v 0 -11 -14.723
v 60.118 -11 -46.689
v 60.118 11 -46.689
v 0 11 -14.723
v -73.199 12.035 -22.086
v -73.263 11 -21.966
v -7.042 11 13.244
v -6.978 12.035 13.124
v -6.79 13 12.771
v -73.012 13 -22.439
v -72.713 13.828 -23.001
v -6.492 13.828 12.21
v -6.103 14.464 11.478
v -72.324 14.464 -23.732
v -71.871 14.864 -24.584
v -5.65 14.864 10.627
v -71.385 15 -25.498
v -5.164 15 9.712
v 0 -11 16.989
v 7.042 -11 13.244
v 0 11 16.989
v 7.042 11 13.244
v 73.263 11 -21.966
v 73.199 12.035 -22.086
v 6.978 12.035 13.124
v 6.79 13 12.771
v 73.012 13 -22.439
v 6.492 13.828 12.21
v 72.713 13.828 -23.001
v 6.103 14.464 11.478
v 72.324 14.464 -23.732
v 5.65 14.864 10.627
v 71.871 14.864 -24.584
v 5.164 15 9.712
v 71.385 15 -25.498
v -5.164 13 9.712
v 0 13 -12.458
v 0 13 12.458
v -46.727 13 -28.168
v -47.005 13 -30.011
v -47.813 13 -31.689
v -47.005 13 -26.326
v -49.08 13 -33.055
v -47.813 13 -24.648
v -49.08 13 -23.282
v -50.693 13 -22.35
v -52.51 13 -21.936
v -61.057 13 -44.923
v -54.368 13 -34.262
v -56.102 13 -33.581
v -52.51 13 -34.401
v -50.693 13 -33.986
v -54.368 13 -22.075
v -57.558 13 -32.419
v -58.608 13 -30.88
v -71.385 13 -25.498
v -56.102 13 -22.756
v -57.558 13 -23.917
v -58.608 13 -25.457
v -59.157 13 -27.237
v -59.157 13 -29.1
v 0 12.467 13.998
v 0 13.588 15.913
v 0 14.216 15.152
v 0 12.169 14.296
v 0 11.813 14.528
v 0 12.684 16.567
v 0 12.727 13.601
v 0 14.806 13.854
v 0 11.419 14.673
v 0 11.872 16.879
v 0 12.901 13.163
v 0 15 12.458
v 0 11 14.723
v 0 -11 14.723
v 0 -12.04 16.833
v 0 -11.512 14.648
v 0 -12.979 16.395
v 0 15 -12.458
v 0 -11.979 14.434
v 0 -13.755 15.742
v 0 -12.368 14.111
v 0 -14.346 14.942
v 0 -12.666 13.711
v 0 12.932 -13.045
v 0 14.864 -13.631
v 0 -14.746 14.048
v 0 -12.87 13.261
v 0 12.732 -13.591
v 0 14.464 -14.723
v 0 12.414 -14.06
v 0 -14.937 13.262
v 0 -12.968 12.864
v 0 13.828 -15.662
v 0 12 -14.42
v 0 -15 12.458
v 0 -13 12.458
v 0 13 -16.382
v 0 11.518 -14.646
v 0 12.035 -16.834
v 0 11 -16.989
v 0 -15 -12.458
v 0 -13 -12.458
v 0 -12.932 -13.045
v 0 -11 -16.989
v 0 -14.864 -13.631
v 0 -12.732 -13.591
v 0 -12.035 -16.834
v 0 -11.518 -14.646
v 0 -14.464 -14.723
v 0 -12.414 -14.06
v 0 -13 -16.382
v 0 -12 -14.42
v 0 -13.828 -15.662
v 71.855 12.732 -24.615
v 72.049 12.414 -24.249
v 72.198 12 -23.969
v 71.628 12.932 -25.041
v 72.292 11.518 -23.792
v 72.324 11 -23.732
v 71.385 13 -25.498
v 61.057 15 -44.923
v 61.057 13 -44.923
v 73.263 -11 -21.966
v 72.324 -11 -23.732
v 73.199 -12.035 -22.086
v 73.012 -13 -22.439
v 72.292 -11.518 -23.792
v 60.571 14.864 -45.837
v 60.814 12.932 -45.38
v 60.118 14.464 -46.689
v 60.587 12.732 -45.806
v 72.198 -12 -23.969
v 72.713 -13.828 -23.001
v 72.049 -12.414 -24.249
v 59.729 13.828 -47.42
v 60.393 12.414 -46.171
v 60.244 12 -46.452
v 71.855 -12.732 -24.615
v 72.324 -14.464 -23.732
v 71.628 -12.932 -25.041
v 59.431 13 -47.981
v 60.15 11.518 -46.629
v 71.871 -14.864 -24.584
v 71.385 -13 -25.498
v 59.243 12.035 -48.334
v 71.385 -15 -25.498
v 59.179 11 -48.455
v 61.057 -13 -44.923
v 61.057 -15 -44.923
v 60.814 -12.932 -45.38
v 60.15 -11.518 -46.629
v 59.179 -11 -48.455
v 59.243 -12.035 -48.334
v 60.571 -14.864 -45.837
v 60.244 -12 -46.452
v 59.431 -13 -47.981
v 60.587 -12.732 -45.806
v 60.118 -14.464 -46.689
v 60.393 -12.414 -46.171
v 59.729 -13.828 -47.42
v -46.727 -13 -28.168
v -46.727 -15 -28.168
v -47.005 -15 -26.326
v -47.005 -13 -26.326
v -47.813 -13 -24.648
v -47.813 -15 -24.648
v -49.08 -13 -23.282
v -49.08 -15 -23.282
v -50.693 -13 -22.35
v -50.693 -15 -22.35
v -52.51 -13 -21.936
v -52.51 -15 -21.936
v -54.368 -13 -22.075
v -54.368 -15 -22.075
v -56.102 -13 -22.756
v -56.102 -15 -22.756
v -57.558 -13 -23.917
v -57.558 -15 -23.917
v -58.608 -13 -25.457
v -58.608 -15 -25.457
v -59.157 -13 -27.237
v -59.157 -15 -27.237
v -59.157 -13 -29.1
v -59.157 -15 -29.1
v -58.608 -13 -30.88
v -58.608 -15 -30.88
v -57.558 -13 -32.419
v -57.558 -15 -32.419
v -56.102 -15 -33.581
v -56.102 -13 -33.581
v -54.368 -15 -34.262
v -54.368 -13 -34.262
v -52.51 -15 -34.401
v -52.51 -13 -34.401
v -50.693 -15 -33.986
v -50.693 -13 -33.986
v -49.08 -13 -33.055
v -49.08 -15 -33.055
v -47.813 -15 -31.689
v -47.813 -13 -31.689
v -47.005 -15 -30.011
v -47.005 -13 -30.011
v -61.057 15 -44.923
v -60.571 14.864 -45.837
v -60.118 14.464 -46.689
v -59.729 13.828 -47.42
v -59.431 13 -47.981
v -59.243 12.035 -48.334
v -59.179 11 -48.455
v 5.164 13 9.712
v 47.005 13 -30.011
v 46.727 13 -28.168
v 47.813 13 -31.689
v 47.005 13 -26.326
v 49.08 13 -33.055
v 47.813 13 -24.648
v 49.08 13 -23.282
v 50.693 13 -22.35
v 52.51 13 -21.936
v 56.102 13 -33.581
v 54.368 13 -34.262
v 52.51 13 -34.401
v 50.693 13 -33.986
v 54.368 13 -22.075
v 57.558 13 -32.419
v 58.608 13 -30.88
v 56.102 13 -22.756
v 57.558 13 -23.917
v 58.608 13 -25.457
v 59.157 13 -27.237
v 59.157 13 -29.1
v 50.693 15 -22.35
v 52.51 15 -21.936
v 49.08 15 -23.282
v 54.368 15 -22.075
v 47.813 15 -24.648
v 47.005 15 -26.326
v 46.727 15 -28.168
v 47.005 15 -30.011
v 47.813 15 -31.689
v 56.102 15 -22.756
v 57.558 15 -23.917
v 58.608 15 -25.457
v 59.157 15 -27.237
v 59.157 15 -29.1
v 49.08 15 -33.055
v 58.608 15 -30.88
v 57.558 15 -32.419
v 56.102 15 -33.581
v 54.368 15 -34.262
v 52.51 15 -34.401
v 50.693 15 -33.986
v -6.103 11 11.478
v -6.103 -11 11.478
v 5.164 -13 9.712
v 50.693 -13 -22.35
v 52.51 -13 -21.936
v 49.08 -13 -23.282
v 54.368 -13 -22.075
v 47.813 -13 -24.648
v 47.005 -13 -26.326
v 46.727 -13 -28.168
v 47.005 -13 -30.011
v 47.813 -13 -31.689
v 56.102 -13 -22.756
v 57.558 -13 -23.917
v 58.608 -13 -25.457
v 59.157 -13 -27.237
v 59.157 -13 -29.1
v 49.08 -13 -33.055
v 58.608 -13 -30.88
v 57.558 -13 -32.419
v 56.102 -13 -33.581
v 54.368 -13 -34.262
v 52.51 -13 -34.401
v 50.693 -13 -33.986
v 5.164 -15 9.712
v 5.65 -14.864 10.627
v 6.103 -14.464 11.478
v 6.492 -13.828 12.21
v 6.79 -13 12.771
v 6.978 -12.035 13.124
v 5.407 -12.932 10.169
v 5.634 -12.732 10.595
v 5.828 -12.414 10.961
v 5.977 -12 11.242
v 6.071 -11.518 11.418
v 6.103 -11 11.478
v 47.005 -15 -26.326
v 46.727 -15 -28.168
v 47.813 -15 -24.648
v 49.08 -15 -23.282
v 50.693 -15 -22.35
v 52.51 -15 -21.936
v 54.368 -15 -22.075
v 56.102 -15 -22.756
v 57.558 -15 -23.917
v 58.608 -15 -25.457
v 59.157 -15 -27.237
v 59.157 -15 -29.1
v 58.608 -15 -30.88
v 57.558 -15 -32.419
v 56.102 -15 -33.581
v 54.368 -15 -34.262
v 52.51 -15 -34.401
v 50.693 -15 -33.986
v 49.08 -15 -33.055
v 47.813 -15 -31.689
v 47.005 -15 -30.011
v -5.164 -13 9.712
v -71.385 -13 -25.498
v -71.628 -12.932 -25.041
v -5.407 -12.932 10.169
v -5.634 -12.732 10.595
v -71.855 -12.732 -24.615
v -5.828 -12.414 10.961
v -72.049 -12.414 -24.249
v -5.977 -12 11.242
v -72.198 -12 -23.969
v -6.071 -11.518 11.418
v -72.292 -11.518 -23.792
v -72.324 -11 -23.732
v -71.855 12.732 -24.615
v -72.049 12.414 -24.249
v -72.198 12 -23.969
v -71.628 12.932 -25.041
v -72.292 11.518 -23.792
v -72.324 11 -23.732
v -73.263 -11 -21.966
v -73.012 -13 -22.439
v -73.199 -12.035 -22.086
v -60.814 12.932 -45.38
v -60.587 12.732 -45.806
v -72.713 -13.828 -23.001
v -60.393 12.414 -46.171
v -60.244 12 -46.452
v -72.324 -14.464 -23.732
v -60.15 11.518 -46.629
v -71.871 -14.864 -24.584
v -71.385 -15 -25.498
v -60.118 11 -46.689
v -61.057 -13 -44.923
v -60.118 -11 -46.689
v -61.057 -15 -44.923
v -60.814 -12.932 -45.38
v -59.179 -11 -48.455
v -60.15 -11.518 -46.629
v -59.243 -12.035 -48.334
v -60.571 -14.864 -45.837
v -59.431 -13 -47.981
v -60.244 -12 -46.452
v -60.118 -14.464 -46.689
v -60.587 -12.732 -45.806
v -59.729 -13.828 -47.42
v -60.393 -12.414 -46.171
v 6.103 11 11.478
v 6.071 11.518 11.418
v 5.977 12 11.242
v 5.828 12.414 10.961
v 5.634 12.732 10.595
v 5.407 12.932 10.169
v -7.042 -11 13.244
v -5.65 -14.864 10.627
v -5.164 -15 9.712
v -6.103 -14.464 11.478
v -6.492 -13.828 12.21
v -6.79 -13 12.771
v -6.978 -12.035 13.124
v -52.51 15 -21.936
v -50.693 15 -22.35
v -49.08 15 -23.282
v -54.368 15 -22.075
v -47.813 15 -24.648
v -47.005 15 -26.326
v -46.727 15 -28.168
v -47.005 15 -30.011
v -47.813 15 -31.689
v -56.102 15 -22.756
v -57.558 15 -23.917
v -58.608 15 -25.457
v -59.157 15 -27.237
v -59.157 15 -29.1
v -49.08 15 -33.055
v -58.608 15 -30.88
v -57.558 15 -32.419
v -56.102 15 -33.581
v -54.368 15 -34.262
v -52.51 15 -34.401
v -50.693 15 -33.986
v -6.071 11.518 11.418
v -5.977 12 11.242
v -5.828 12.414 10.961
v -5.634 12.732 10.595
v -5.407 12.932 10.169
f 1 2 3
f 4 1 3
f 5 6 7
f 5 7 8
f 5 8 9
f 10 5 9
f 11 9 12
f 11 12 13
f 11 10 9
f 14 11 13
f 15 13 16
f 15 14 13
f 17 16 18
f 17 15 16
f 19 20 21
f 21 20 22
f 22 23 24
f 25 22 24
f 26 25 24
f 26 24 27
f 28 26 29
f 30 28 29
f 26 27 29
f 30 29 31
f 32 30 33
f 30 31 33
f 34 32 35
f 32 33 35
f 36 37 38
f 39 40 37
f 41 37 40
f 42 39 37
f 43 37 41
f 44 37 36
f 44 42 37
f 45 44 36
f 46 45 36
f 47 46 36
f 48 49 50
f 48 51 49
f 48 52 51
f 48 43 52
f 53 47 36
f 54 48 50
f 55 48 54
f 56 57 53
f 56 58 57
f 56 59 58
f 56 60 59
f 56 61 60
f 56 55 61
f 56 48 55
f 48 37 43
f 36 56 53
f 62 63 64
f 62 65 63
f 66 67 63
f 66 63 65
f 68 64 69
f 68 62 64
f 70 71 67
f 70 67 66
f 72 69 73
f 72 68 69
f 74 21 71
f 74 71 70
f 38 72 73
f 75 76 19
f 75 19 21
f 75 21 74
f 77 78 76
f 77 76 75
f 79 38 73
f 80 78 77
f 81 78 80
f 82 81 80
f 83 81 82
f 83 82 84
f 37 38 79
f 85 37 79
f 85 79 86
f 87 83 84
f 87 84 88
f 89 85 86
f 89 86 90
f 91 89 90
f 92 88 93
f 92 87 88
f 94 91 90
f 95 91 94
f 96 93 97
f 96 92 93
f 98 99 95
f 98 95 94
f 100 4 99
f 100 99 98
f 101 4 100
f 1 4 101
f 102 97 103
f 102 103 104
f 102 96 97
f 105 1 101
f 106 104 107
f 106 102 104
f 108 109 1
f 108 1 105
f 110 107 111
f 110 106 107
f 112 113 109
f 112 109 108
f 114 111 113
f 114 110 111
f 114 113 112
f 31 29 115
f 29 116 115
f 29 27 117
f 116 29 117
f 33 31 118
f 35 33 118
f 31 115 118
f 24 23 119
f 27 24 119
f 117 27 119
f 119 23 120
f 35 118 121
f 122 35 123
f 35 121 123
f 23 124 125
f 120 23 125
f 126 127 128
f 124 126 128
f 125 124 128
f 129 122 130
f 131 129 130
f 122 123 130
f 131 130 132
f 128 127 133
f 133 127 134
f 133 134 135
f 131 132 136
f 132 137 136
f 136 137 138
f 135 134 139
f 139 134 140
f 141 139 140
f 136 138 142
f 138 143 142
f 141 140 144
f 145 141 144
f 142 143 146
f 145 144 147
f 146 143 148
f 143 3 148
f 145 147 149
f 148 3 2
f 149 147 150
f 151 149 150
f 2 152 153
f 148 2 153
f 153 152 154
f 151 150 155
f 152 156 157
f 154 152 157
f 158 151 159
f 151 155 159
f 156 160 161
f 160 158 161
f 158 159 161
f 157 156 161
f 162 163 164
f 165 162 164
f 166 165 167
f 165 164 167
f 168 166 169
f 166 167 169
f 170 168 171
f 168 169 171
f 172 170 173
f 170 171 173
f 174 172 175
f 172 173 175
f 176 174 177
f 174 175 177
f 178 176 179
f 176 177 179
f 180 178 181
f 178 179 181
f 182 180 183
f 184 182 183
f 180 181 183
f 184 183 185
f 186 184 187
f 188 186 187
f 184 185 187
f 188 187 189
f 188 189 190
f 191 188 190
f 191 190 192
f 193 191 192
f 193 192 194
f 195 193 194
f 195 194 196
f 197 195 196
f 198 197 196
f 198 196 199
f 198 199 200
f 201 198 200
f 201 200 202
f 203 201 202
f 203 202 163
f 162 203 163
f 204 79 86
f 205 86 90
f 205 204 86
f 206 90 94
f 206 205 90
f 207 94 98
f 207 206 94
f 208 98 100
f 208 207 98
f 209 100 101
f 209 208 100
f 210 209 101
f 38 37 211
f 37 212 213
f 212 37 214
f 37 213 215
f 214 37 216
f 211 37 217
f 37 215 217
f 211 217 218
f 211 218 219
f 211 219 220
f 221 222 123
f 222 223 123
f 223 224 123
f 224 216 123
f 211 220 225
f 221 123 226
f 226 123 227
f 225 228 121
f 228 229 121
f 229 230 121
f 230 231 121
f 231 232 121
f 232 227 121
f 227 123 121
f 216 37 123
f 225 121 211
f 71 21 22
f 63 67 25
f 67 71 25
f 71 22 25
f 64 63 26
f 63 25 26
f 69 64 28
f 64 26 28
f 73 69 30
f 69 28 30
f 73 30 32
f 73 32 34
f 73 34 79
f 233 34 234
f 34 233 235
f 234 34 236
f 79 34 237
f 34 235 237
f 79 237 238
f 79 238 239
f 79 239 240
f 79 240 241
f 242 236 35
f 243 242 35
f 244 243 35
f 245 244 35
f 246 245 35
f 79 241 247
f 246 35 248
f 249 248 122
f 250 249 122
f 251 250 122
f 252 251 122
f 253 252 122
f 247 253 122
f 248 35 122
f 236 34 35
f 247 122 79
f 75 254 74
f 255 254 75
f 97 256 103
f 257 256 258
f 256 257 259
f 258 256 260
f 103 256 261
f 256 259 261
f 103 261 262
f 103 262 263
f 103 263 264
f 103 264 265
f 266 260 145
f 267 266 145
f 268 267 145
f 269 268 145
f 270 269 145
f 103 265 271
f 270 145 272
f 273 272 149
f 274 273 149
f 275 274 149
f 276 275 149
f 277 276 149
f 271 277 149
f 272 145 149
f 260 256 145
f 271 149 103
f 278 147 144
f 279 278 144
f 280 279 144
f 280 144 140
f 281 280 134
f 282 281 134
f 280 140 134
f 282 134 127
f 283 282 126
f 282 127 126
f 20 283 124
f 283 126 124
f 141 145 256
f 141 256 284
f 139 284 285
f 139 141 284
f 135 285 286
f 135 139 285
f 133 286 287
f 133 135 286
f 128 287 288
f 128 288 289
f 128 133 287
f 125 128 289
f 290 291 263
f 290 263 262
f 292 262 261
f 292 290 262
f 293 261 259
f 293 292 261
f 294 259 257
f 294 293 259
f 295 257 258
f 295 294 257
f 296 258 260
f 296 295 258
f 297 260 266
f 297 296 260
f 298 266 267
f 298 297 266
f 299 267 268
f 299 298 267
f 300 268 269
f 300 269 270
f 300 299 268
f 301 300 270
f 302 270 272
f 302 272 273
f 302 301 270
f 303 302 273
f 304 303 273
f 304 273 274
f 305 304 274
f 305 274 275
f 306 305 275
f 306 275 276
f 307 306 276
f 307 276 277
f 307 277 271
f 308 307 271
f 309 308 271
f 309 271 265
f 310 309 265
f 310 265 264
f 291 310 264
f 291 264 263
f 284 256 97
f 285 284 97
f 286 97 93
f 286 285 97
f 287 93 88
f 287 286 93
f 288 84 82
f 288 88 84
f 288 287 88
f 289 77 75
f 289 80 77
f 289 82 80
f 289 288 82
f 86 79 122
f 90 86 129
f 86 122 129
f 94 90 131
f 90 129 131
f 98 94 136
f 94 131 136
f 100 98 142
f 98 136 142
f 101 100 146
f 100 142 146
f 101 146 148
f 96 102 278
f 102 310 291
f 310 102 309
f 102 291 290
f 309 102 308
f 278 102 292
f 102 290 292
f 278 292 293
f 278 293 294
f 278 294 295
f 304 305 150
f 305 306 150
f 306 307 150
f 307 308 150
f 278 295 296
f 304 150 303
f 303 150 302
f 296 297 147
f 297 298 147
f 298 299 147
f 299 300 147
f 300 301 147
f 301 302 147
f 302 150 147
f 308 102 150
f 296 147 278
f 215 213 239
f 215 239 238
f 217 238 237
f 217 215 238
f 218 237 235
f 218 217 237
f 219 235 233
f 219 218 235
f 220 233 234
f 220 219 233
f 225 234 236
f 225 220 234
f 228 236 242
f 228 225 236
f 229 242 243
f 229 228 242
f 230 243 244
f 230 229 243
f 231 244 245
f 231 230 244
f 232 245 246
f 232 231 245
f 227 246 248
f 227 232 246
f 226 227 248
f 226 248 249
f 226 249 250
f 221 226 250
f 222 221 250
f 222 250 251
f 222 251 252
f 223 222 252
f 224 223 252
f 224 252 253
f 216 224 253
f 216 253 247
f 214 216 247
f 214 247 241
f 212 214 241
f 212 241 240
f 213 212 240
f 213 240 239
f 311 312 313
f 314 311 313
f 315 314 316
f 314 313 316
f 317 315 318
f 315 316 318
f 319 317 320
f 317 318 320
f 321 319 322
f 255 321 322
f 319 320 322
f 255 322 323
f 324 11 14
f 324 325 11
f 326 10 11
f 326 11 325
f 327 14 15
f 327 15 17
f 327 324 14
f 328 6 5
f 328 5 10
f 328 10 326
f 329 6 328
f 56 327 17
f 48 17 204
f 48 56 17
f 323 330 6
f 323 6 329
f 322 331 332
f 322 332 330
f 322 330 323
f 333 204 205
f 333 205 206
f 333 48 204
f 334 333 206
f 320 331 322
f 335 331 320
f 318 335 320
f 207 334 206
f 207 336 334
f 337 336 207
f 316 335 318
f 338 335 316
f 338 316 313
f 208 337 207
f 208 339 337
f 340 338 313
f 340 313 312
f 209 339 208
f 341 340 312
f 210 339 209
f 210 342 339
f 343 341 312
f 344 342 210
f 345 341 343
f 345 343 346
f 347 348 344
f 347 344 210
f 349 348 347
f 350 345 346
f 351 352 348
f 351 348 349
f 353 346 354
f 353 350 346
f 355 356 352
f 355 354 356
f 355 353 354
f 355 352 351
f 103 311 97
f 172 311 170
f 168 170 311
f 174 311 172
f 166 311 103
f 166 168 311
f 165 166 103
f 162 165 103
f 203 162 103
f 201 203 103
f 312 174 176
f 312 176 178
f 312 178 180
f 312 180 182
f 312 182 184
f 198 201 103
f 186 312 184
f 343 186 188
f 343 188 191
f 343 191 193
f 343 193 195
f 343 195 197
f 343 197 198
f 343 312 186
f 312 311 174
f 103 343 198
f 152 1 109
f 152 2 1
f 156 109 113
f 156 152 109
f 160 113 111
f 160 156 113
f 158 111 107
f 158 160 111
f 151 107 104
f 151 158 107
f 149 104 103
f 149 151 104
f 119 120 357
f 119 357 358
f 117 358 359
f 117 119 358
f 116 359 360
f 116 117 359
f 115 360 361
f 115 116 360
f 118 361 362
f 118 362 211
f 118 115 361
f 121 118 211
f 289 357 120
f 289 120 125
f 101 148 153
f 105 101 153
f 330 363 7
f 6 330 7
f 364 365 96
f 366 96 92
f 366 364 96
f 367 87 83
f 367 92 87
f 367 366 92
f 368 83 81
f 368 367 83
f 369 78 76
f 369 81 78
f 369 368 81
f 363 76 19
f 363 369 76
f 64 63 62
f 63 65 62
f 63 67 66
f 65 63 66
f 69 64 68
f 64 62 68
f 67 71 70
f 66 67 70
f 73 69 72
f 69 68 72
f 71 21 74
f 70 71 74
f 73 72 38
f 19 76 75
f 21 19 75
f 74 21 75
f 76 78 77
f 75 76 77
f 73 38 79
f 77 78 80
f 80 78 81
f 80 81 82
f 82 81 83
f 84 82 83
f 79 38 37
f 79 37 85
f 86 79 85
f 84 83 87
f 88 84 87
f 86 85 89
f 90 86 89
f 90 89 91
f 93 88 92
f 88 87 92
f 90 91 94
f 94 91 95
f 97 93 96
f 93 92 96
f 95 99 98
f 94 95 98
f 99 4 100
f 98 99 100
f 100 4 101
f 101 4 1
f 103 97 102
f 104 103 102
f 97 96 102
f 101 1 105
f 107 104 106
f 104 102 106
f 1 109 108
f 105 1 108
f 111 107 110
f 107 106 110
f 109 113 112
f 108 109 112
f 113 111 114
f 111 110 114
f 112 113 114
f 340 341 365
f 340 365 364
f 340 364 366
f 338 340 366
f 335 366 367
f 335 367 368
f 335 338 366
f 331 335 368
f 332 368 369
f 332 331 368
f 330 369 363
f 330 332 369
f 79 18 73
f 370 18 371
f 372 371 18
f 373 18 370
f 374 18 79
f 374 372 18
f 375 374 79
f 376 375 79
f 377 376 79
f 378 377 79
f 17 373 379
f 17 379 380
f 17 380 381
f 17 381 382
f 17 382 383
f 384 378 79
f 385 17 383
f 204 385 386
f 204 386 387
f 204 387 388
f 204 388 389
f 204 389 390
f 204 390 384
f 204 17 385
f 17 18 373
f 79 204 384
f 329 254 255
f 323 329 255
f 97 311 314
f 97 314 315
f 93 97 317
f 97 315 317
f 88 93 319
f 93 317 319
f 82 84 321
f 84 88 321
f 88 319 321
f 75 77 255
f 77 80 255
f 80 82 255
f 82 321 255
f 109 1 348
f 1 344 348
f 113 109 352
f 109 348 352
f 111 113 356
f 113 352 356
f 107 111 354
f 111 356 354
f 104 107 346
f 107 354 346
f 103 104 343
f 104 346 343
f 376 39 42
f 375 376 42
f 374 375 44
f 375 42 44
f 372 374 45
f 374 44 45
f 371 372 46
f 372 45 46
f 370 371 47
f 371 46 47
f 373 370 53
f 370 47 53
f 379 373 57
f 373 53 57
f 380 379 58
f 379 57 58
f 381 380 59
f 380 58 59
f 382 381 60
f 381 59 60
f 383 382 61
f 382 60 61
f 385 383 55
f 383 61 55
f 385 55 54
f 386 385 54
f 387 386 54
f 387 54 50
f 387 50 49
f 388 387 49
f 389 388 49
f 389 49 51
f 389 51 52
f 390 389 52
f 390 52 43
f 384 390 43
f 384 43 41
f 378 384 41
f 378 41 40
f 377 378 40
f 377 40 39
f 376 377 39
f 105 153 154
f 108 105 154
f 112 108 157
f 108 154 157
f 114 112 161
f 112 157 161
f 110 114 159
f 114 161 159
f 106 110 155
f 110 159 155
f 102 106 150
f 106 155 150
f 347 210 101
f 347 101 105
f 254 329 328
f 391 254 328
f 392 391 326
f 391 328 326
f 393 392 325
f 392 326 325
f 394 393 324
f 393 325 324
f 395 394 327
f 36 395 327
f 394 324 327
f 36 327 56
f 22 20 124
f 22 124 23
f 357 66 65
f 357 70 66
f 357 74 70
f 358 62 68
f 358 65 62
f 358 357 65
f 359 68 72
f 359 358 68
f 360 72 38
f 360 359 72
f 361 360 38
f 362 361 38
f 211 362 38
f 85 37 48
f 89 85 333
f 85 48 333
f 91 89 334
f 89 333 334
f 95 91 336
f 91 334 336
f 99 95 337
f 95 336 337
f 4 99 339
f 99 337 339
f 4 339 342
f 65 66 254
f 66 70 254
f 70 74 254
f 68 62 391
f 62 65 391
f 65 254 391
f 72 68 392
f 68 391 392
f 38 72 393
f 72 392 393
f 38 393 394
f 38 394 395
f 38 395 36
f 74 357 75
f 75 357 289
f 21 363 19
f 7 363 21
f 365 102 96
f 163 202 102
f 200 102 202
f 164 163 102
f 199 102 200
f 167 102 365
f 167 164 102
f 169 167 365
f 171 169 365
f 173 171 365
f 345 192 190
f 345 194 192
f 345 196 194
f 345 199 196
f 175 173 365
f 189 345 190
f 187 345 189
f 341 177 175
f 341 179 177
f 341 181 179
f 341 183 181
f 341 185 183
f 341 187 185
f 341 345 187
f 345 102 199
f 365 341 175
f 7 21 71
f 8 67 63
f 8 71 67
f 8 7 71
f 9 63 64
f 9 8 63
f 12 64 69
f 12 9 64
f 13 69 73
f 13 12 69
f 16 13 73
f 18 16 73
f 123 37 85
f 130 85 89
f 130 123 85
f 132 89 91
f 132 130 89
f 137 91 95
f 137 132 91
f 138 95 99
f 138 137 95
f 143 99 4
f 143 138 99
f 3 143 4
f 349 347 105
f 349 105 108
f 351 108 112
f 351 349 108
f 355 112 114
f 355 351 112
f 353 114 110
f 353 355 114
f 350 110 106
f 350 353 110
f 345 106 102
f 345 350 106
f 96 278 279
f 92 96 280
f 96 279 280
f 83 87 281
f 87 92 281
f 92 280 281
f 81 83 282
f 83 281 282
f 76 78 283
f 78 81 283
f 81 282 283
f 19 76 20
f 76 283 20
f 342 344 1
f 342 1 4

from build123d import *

# Parameters (mm, degrees)
F4_DEPTH = 25
F6_DEPTH = 30.001
F7_R     = 6.25
F8_DEPTH = 30.001


with BuildPart() as f3:
    # F3: sweep along a path in F0
    with BuildLine(Plane.XZ) as f3_path:
        Line((0, 0), (-66.2210694644, -35.2103672089))
    # F2 (on line) → F3 (sweep)
    with BuildSketch(Plane(origin=(-66.2210694644, 0, -35.2103672089), x_dir=(0, -1, 0), z_dir=(-0.8829475929, 0, -0.4694715628))):
        with BuildLine():
            Line((-11, -15), (11, -15))
            ThreePointArc((11, -15), (13.8284271247, -13.8284271247), (15, -11))
            Line((15, -11), (15, 11))
            ThreePointArc((15, 11), (13.8284271247, 13.8284271247), (11, 15))
            Line((11, 15), (-11, 15))
            ThreePointArc((-11, 15), (-13.8284271247, 13.8284271247), (-15, 11))
            Line((-15, 11), (-15, -11))
            ThreePointArc((-15, -11), (-13.8284271247, -13.8284271247), (-11, -15))
        make_face()
        with BuildLine():
            ThreePointArc((-11, -13), (-12.4142135624, -12.4142135624), (-13, -11))
            Line((-13, -11), (-13, 11))
            ThreePointArc((-13, 11), (-12.4142135624, 12.4142135624), (-11, 13))
            Line((-11, 13), (11, 13))
            ThreePointArc((11, 13), (12.4142135624, 12.4142135624), (13, 11))
            Line((13, 11), (13, -11))
            ThreePointArc((13, -11), (12.4142135624, -12.4142135624), (11, -13))
            Line((11, -13), (-11, -13))
        make_face(mode=Mode.SUBTRACT)
    sweep(path=f3_path.line)

    # F4 (add): a face of the model
    f4_faces = [f3.faces().sort_by_distance(p)[0] for p in [
        (6.8428935264, 0, -12.8696109547),
    ]]
    extrude(f4_faces, amount=F4_DEPTH)

    # F5 (on face) → F6 (cut, through all)
    with BuildSketch(Plane.XZ.offset(15)):
        Polygon((15.0316163797, 24.9810029625), (0, 16.9885507603), (0, -16.9885507603), (29.1157632633, -1.5074248232), align=None)
    extrude(amount=-F6_DEPTH, mode=Mode.SUBTRACT)

    # F7 (on face) → F8 (cut, through all)
    with BuildSketch(Plane.XZ.offset(15)):
        with Locations((-52.9768555715, -28.1682937672)):
            Circle(F7_R)
    extrude(amount=-F8_DEPTH, mode=Mode.SUBTRACT)


with BuildPart() as f9_1:
    # F9: instance of F3
    add(f3.part.mirror(Plane.YZ))


solid = Compound([f3.part, f9_1.part])
